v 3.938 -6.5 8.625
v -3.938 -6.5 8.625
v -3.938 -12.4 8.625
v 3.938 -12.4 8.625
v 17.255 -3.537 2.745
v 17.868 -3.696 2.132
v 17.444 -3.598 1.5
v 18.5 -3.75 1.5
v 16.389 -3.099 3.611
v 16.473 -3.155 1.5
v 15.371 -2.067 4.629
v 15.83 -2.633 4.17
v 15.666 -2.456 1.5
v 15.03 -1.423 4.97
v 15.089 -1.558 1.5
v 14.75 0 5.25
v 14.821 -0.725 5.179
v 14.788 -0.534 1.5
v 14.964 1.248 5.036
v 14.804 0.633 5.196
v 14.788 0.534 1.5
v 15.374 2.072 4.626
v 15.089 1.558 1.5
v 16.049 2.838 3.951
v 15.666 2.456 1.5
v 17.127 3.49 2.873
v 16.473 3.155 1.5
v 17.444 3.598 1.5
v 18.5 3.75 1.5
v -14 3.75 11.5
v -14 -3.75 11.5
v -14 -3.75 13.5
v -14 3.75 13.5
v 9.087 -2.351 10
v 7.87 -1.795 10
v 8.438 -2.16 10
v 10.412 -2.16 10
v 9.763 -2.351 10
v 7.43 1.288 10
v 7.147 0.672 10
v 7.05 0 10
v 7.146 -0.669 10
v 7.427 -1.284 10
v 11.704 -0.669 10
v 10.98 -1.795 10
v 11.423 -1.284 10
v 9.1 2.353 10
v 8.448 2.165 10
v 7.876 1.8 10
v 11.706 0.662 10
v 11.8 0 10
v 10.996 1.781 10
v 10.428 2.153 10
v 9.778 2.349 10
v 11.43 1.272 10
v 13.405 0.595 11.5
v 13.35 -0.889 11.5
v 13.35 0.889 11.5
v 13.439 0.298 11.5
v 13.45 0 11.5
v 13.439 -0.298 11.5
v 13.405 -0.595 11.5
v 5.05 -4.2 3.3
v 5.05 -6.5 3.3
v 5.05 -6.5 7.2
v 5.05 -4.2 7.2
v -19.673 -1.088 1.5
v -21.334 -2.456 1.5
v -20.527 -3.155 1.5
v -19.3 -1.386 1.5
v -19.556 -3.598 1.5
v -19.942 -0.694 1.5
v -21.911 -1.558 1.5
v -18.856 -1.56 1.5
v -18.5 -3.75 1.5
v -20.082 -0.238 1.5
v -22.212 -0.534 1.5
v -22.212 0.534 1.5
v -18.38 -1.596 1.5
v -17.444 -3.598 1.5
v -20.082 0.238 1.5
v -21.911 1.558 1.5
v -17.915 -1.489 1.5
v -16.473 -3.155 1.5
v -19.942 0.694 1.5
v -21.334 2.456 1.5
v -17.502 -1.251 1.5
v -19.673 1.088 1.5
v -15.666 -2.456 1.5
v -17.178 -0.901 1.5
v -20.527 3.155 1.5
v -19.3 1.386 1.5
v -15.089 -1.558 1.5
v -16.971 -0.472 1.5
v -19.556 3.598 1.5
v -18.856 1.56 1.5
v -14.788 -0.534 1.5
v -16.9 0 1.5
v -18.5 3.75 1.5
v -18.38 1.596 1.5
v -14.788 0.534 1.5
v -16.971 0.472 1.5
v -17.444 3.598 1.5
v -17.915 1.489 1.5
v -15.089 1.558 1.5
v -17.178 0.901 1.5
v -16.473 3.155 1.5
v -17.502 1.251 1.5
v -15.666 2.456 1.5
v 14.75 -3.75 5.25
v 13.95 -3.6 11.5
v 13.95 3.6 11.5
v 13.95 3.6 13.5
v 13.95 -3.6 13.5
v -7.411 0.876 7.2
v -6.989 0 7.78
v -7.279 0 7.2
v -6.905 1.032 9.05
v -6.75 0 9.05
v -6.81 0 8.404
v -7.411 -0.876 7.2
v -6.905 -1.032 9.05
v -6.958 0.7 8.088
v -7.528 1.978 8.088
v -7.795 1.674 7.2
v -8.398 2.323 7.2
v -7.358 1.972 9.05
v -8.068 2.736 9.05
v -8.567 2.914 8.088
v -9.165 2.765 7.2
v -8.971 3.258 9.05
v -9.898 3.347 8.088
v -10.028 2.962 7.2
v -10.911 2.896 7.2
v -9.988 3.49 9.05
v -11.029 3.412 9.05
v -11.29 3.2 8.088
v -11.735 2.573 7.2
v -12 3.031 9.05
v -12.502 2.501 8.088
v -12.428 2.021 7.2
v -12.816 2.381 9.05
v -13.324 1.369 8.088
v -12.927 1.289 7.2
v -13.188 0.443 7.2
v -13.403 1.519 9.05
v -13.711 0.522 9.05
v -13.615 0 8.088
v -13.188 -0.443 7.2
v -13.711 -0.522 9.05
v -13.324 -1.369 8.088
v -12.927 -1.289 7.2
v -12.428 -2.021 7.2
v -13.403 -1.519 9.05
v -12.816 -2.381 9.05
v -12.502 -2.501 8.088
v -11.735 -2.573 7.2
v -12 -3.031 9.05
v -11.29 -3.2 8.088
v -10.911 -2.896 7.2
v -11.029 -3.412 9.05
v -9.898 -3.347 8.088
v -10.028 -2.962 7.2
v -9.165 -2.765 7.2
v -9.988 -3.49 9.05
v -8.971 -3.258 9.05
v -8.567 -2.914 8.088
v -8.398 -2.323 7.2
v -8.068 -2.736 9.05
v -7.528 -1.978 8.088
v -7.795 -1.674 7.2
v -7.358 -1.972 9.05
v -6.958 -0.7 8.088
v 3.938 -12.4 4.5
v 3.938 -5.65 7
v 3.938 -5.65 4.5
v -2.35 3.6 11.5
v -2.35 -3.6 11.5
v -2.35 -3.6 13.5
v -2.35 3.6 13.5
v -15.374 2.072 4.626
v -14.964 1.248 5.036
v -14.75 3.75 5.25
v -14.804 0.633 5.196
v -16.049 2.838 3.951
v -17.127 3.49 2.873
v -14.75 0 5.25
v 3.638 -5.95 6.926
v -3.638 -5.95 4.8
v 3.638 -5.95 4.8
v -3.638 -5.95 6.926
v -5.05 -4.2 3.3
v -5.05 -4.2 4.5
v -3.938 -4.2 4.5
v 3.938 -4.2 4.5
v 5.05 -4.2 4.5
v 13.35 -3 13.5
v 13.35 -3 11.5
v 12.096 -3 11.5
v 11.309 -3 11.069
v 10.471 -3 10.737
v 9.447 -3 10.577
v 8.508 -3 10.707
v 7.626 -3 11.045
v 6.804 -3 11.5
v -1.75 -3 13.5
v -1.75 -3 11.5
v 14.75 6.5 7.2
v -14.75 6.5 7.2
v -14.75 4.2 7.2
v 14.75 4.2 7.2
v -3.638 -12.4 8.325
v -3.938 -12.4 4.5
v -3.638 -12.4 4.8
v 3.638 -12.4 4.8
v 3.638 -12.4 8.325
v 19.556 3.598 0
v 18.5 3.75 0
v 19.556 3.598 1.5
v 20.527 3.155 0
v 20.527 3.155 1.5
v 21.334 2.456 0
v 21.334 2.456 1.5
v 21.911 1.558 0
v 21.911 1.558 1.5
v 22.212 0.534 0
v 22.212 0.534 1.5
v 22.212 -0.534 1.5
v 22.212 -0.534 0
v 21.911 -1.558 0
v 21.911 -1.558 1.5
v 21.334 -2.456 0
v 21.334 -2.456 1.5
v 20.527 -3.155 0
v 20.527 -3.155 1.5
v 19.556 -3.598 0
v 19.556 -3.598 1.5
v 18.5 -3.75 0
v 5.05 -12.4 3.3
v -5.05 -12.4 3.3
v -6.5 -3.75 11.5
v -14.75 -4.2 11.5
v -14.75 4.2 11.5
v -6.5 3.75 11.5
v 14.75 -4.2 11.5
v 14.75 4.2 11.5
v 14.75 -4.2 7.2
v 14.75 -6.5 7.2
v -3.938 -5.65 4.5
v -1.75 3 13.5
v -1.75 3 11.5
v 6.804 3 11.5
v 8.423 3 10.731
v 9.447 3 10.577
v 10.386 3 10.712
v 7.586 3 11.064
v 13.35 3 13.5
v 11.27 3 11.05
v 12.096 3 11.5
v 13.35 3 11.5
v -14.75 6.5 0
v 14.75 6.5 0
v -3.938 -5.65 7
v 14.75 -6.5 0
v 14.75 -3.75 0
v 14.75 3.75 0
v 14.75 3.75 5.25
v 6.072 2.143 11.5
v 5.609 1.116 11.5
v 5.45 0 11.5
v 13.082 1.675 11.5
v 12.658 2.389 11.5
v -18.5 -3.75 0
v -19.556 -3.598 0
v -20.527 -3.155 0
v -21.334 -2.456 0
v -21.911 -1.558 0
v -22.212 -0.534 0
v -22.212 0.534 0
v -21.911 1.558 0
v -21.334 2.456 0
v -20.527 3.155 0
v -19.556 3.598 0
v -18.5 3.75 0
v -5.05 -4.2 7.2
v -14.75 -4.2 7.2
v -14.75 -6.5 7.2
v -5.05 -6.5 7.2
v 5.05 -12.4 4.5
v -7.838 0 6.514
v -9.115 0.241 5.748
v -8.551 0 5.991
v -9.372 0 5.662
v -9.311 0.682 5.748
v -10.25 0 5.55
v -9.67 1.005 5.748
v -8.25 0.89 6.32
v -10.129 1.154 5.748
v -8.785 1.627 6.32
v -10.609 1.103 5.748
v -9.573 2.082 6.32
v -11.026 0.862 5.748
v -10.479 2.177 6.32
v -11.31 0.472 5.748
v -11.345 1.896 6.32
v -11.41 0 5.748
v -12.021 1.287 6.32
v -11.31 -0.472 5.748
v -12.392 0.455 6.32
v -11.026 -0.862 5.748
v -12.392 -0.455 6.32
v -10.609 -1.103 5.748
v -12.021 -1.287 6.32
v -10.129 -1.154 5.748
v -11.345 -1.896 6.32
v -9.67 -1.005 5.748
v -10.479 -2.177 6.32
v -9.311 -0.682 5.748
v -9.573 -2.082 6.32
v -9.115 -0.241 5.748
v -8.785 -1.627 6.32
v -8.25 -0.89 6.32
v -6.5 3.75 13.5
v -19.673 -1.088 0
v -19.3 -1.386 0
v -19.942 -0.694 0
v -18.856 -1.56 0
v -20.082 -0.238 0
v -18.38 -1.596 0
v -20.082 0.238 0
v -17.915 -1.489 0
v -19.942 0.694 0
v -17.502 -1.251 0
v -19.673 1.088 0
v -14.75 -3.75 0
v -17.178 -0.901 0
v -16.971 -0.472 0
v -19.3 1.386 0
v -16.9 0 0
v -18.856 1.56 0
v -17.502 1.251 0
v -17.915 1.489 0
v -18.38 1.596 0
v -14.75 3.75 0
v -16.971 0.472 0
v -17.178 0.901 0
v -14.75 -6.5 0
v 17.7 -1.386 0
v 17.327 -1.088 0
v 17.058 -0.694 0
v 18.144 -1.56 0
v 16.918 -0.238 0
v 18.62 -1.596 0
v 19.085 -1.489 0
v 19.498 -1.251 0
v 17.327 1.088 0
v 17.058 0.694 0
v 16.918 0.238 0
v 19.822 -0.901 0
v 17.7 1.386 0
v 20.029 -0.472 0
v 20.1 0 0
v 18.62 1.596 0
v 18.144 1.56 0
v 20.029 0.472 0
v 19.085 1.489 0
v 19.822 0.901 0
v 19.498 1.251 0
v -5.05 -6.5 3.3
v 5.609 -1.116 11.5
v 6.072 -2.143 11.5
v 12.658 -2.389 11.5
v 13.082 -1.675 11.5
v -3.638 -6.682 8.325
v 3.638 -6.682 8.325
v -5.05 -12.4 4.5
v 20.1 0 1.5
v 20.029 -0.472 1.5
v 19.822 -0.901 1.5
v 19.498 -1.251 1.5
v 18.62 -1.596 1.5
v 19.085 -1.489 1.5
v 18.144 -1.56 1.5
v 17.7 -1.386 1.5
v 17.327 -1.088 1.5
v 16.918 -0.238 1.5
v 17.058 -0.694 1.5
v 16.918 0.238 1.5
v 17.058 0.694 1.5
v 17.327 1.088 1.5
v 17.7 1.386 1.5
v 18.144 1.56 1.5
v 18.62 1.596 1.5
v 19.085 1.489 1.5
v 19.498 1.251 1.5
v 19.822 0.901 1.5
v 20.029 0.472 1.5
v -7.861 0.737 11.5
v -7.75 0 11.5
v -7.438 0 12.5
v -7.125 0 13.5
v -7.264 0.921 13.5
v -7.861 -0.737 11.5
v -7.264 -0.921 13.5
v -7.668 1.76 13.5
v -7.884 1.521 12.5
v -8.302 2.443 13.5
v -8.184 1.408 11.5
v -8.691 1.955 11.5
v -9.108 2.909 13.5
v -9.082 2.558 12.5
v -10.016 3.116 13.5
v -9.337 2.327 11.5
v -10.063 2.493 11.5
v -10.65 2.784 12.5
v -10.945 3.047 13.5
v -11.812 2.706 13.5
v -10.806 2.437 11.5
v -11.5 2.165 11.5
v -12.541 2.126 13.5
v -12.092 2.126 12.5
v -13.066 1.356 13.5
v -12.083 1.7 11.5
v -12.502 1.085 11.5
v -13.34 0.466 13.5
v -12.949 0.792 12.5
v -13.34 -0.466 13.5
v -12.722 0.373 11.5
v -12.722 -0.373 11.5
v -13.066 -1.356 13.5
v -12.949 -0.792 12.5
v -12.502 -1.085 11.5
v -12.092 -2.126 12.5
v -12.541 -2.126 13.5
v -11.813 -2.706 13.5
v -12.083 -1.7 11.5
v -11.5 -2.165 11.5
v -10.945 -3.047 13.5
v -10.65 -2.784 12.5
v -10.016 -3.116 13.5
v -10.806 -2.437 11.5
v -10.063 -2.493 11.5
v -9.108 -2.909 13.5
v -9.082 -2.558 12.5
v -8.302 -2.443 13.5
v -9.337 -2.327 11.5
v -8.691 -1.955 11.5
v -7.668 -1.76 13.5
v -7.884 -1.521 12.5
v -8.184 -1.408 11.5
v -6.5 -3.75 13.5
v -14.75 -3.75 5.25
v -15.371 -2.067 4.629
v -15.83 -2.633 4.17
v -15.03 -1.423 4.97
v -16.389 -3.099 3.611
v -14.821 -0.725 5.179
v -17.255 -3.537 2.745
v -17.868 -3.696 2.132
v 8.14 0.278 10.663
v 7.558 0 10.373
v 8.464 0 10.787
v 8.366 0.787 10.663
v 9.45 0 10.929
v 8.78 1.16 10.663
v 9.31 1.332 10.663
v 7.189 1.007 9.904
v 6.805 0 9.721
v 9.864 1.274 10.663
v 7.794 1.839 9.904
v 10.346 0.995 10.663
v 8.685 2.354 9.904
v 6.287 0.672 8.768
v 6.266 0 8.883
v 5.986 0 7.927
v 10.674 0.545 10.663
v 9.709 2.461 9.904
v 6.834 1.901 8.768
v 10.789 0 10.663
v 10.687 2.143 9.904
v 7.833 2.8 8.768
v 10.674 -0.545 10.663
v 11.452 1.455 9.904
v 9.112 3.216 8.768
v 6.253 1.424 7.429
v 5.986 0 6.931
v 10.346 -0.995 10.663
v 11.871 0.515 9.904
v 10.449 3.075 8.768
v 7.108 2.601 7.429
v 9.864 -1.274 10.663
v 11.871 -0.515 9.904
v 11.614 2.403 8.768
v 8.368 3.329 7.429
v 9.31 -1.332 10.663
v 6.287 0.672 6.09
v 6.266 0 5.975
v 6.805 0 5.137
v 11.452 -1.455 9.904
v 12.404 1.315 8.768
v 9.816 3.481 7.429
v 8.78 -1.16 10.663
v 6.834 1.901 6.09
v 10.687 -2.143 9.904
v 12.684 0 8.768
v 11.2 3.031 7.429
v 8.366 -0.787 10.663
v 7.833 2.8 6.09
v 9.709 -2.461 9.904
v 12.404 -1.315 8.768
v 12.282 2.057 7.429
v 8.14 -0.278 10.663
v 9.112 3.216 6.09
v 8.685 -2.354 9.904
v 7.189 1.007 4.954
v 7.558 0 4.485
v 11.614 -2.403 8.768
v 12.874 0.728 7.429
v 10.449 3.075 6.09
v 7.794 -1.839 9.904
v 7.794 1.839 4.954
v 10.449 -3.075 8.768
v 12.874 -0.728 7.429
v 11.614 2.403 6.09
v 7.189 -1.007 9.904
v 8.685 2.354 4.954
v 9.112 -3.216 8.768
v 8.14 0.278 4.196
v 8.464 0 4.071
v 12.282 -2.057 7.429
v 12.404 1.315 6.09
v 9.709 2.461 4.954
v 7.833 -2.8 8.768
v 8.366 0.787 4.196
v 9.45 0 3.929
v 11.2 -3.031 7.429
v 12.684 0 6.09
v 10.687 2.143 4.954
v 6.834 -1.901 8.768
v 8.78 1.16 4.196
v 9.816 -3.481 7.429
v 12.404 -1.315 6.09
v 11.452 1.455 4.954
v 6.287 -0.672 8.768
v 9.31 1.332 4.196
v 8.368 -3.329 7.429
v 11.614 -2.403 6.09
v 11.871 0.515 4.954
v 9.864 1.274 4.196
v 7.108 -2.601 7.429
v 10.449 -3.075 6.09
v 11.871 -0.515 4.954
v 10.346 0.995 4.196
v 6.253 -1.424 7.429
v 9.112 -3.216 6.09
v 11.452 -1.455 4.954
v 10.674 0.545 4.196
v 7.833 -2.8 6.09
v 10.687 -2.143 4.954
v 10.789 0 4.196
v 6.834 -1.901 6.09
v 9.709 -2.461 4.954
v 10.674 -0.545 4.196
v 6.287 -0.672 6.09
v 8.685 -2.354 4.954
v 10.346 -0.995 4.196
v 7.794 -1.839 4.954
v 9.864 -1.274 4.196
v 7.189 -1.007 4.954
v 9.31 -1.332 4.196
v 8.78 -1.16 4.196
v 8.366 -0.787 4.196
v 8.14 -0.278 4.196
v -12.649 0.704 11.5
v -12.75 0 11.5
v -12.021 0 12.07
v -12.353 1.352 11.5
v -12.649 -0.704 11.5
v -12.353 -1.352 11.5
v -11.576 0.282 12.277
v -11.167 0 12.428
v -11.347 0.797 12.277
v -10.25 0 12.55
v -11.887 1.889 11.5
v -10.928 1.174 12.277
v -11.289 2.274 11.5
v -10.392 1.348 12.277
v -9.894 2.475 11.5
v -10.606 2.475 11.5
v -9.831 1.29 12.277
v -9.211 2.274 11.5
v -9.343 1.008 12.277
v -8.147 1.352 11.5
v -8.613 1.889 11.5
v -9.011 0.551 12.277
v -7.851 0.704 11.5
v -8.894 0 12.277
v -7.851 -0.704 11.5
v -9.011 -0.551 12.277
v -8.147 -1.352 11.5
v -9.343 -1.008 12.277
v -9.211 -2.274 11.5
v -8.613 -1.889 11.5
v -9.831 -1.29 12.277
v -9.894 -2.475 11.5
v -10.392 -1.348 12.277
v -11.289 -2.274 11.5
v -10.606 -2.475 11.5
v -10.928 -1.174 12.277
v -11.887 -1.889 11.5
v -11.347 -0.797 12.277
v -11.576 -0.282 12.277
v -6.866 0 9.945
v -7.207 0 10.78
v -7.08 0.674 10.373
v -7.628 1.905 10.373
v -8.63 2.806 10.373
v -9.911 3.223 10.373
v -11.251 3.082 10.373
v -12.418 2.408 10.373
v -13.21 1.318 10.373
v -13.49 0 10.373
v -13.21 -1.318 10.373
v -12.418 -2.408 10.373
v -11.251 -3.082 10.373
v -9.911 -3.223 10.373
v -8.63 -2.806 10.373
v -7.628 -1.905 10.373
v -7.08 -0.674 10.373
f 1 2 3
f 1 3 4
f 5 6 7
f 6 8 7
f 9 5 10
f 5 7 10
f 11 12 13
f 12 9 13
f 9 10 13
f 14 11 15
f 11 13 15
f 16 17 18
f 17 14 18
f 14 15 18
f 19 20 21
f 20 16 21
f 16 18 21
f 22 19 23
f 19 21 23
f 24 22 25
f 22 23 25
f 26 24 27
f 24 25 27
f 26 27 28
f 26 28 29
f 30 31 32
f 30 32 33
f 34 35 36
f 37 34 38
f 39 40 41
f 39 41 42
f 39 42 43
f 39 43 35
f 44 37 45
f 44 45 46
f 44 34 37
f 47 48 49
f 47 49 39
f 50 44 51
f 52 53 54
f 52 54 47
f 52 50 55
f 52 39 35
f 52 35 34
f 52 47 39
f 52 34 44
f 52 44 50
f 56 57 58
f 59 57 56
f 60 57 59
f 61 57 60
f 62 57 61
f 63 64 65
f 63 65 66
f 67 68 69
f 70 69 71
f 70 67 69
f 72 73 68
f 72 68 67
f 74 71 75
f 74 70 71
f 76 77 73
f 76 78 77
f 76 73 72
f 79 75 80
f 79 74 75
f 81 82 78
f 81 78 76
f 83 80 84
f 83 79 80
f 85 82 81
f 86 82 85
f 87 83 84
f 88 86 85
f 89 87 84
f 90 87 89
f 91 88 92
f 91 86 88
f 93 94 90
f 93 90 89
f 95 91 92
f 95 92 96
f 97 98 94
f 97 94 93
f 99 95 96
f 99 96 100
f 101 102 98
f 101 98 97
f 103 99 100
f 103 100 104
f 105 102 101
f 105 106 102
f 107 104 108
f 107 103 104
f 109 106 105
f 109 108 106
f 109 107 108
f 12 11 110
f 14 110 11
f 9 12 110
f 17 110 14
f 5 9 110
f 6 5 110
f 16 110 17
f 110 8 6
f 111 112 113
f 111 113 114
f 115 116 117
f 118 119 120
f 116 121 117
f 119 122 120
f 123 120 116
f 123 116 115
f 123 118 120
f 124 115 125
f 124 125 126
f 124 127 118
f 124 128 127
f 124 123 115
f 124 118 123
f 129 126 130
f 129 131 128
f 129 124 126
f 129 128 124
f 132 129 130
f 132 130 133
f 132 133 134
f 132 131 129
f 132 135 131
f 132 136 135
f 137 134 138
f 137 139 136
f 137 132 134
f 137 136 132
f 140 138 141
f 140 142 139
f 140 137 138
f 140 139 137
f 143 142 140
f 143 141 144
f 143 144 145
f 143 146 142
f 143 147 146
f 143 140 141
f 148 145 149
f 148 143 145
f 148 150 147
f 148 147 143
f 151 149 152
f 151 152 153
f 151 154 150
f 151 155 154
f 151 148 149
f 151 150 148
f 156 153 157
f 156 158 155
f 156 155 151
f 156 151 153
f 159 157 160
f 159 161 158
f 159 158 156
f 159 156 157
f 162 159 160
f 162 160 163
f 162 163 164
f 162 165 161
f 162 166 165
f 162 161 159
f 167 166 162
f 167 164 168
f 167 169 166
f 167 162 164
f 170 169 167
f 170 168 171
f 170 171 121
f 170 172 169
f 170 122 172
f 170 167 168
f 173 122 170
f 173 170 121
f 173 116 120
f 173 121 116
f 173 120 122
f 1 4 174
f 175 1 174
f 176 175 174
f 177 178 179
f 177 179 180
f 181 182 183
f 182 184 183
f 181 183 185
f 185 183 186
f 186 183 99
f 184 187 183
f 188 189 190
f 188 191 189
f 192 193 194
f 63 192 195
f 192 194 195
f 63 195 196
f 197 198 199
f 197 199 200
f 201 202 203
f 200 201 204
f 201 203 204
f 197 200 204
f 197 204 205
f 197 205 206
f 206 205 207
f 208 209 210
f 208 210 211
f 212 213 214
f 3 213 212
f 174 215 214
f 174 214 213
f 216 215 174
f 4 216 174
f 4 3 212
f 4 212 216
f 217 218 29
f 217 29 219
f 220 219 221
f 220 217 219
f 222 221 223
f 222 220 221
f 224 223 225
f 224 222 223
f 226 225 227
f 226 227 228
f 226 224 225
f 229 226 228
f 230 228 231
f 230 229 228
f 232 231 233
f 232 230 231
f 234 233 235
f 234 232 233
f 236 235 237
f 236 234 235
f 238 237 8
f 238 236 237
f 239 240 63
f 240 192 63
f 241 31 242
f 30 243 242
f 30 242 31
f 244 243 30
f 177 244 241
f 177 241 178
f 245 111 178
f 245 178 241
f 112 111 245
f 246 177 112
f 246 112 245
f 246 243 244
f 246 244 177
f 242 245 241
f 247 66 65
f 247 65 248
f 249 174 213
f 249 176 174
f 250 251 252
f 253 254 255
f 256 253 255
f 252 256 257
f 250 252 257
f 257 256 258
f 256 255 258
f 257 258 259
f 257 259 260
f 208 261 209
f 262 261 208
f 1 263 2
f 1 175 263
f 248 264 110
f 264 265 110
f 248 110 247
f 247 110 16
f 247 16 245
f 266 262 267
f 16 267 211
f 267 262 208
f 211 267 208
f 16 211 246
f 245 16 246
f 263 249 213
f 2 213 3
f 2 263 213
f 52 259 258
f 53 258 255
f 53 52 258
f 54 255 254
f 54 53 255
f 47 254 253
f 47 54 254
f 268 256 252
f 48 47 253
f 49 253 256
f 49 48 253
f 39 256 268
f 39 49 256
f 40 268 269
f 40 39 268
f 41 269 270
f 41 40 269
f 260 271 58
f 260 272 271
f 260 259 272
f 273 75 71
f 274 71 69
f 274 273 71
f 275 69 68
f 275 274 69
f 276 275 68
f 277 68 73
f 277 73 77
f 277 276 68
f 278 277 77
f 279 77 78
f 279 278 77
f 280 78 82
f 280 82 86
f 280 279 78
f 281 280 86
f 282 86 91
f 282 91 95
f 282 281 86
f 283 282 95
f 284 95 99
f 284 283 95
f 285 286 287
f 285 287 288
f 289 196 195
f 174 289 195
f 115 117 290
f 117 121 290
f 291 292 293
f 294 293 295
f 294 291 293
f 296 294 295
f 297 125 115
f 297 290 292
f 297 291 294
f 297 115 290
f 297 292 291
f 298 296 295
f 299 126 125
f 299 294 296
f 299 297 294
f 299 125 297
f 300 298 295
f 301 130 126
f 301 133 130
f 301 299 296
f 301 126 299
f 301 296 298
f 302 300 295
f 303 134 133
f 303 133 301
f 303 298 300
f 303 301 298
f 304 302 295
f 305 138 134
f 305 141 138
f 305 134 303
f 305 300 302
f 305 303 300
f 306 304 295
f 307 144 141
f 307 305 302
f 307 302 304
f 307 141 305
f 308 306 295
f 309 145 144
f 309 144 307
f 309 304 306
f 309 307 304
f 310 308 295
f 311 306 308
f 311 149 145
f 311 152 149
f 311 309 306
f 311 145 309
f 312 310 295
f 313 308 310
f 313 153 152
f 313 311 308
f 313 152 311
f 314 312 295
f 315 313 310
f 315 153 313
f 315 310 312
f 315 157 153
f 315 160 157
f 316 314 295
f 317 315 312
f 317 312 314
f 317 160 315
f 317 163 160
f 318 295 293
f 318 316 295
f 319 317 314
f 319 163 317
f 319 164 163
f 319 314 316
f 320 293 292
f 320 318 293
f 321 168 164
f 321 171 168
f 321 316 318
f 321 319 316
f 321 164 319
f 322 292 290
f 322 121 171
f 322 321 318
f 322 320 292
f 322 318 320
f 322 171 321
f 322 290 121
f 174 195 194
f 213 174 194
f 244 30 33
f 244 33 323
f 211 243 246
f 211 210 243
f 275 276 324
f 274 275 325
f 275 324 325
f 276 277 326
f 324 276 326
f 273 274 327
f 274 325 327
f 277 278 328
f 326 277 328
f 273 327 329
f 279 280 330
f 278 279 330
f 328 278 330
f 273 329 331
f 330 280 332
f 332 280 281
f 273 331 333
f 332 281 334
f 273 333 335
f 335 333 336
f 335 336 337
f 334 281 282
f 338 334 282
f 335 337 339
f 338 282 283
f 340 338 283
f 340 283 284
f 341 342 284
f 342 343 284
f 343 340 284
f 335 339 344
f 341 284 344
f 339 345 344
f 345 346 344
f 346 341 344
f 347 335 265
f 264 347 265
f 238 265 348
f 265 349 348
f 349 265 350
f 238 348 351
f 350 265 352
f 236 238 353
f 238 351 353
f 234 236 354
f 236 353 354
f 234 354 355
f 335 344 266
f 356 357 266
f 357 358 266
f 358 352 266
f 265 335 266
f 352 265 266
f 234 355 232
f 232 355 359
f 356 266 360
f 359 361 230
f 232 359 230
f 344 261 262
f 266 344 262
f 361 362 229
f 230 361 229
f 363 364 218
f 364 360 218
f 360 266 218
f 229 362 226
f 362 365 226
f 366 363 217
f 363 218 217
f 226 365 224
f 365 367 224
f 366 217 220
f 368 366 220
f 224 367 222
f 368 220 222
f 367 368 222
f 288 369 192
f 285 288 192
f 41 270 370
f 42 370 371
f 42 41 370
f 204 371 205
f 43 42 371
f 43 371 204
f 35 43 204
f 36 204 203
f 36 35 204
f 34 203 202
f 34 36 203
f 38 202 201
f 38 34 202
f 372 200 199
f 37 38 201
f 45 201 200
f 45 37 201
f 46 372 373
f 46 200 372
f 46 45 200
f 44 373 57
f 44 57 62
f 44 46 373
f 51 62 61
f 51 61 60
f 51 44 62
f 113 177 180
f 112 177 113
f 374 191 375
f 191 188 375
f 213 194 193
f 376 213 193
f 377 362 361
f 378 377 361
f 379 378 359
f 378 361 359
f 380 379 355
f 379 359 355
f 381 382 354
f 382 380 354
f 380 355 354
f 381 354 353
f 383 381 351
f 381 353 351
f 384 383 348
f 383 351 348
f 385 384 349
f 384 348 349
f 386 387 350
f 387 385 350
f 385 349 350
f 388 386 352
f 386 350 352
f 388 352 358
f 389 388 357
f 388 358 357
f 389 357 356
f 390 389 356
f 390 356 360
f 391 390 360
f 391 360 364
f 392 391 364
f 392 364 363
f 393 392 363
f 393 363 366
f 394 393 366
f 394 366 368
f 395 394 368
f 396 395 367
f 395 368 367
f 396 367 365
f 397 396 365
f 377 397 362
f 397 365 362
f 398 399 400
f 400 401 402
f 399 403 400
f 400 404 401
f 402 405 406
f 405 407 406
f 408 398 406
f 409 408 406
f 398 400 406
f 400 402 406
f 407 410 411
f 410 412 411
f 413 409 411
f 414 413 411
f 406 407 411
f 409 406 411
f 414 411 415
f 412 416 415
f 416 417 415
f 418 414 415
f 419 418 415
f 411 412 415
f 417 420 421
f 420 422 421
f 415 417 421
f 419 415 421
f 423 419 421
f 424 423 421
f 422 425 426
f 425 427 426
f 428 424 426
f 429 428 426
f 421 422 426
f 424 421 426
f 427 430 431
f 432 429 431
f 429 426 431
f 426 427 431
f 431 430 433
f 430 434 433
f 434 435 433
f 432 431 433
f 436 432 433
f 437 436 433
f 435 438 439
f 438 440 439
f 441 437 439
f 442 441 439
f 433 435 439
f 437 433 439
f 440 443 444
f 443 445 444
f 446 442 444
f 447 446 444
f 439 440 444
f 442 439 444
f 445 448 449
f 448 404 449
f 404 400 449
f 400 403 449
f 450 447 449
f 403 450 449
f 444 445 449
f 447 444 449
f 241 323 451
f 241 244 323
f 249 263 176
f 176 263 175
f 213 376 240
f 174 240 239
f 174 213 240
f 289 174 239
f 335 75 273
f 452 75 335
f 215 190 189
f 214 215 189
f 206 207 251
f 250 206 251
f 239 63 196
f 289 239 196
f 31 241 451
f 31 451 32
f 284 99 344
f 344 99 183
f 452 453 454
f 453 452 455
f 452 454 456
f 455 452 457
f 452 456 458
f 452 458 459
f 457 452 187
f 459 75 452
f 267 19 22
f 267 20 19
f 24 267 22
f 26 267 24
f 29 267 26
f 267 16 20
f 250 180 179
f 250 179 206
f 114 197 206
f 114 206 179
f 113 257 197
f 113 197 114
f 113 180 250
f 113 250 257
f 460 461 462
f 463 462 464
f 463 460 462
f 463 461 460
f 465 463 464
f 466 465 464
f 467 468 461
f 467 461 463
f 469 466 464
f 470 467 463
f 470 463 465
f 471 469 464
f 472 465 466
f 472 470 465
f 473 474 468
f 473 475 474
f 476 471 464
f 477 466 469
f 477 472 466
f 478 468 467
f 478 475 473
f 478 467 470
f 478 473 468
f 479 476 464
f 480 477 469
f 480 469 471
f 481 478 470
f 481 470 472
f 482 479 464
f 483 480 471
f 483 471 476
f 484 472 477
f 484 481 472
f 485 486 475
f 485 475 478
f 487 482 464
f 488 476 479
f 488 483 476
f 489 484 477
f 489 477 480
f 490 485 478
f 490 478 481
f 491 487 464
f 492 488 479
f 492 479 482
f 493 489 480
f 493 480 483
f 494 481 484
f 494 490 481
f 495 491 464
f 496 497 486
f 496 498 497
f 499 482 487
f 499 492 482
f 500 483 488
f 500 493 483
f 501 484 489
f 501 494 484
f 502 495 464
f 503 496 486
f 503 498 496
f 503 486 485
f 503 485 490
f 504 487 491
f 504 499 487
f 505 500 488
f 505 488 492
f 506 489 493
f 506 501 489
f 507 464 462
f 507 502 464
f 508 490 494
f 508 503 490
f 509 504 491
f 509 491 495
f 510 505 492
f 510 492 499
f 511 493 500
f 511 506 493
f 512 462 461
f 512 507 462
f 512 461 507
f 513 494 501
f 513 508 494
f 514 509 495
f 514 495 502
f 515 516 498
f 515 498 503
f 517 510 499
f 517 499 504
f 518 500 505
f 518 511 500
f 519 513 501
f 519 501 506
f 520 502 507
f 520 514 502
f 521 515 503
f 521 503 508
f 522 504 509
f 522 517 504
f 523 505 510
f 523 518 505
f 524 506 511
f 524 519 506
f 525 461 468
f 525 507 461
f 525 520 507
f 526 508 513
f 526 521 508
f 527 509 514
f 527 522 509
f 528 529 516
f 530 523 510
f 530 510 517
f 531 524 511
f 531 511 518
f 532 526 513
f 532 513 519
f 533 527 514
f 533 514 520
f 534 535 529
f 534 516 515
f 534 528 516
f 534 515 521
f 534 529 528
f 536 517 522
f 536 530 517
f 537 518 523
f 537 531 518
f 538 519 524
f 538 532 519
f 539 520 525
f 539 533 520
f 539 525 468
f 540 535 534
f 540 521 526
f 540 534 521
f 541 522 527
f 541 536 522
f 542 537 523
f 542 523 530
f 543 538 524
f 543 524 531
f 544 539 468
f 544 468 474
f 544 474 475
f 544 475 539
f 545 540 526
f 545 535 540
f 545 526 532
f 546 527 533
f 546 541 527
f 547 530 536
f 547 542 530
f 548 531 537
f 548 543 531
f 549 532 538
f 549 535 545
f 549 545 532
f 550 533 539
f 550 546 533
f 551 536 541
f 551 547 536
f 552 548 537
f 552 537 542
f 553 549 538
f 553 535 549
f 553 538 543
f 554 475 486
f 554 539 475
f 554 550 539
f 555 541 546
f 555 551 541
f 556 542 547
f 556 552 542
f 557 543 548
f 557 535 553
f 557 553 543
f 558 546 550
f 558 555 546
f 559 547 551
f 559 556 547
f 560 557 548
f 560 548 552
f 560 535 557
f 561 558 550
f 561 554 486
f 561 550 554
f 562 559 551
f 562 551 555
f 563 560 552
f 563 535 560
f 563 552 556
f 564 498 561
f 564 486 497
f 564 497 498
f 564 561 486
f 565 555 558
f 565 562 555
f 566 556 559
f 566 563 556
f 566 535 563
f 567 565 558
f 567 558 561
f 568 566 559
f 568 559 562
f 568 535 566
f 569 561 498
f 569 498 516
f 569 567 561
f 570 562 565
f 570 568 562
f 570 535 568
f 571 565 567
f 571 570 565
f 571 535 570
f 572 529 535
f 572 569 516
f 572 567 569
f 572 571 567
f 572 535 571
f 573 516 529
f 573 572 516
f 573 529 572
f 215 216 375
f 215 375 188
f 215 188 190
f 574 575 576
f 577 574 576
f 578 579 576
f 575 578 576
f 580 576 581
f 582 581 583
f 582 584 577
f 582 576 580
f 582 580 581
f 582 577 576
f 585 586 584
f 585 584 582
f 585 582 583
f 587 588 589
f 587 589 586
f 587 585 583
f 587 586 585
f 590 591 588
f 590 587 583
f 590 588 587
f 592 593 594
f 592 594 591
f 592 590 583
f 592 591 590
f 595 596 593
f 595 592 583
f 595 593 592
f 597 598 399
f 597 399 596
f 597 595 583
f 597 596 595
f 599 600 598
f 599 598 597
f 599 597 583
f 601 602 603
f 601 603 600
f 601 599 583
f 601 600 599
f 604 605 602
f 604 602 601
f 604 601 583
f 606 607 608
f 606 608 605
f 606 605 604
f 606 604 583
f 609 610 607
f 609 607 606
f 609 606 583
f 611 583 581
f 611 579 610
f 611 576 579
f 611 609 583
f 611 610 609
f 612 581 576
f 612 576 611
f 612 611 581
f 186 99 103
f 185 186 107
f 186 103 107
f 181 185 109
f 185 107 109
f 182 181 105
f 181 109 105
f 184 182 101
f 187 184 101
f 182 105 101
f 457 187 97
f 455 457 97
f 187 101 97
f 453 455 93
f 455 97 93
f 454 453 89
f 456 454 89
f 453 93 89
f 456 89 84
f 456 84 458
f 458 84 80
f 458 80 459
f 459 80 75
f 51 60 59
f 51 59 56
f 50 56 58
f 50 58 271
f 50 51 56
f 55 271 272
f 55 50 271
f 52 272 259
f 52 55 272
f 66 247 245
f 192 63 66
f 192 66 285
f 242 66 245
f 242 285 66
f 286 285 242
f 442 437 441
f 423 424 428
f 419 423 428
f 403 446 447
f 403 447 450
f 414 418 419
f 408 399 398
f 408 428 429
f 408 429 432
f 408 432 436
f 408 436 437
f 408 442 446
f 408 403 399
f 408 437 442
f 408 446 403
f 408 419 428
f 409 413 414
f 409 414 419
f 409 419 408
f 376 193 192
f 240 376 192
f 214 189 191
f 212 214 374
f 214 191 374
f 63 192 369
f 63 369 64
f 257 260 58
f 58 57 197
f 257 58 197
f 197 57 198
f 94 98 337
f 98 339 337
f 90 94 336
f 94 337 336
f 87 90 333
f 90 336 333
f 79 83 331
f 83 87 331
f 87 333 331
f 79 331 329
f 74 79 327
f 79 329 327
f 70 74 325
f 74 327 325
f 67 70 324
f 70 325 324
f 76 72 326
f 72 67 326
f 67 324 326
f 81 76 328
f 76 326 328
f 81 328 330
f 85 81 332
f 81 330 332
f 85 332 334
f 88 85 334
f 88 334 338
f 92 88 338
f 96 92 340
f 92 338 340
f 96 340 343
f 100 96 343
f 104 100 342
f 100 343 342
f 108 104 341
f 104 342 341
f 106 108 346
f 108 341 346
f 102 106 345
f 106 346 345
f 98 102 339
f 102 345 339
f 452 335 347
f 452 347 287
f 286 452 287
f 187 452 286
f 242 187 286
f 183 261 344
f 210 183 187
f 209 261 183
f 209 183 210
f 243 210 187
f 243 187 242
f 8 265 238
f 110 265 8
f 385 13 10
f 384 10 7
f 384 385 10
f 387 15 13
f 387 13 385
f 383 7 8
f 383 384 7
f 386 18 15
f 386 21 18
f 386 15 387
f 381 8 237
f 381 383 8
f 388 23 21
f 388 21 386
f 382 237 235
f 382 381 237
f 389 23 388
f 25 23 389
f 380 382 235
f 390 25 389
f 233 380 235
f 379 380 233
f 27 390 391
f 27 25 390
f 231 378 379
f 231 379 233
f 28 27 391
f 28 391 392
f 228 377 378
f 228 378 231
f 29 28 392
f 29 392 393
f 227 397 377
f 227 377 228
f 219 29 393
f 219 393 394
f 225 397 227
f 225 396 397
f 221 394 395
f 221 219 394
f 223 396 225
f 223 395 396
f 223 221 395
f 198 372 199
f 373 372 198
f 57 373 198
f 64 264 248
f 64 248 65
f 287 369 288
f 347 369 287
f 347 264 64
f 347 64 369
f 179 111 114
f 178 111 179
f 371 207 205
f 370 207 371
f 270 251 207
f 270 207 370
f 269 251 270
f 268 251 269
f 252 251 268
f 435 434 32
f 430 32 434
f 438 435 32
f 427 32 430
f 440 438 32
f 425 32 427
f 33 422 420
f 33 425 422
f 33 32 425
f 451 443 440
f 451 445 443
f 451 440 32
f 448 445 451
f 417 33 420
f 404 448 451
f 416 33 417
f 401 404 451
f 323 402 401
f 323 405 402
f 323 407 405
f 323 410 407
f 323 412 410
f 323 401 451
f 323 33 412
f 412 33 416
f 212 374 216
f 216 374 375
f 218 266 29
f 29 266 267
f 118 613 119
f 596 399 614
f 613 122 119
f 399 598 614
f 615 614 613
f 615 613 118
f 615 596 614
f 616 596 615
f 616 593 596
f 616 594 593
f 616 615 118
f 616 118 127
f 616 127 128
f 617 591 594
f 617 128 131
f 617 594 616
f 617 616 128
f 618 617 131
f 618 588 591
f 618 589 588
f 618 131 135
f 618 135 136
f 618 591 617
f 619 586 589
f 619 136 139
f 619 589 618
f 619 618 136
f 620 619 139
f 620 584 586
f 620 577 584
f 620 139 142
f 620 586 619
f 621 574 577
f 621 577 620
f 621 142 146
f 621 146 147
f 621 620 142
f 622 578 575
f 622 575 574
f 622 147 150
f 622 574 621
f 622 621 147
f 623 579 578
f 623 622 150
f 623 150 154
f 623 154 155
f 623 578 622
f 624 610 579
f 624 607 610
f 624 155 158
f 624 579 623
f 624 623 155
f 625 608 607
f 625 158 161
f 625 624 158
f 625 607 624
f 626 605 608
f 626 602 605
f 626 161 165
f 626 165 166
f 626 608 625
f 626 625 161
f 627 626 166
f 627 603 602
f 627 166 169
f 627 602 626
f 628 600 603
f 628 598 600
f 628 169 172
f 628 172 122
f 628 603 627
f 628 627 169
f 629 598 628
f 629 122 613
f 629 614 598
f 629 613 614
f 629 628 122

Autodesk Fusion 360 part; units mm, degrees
sketch "Base" plane through (0, 0, 0) normal (0, 0, 1) x (1, 0, 0)
  line L0 (-14.75, 6.5) -> (14.75, 6.5)
  line L1 (14.75, 6.5) -> (14.75, -6.5)
  line L2 (14.75, -6.5) -> (-14.75, -6.5)
  line L3 (-14.75, -6.5) -> (-14.75, 6.5)
  line L4 (-18.5, 0) -> (18.5, 0) construction
  circle A0 centre (18.5, 0) radius 1.6
  circle A1 centre (18.5, 0) radius 3.75
  circle A2 centre (-18.5, 0) radius 1.6
  circle A3 centre (-18.5, 0) radius 3.75
  line L5 (-14.75, 3.75) -> (-18.5, 3.75)
  line L6 (14.75, 3.75) -> (18.5, 3.75)
  line L7 (-14.75, -3.75) -> (-18.5, -3.75)
  line L8 (14.75, -3.75) -> (18.5, -3.75)
  line L9 (-6.5, -3.75) -> (-14, -3.75)
  line L10 (-14, -3.75) -> (-14, 3.75)
  line L11 (-14, 3.75) -> (-6.5, 3.75)
  line L12 (-6.5, 3.75) -> (-6.5, -3.75)
  line L13 (-14.75, 4.2) -> (14.75, 4.2)
  line L14 (14.75, -4.2) -> (-14.75, -4.2)
  line L15 (-2.35, 3.6) -> (13.95, 3.6)
  line L16 (13.95, 3.6) -> (13.95, -3.6)
  line L17 (13.95, -3.6) -> (-2.35, -3.6)
  line L18 (-2.35, -3.6) -> (-2.35, 3.6)
  line L19 (-2.35, -3.6) -> (13.95, 3.6) construction
  line L20 (-14, -3.75) -> (-6.5, 3.75) construction
  line L21 (-14.75, -6.5) -> (14.75, 6.5) construction
  line L22 (13.35, -3) -> (-1.75, -3)
  line L23 (-1.75, -3) -> (-1.75, 3)
  line L24 (-1.75, 3) -> (13.35, 3)
  line L25 (13.35, 3) -> (13.35, -3)
  line L26 (0, 0) -> (0, -6.5) construction
  line L27 (-5.05, -6.5) -> (-5.05, -4.2)
  line L28 (5.05, -6.5) -> (5.05, -4.2)
  point P0 (-10.25, 0)
  point P1 (9.45, 0)
  point P2 (-10.25, 0)
  point P3 (5.8, 0)
  dimension "d1" = 29.5
  dimension "d2" = 13
  dimension "d3" = 37
  dimension "d4" = 3.2
  dimension "d5" = 7.5
  dimension "d6" = 19.7
  dimension "d7" = 4.5
  dimension "d8" = 7.5
  dimension "d9" = 7.5
  dimension "d10" = 8.4
  dimension "d11" = 4.2
  dimension "d12" = 16.3
  dimension "d13" = 7.2
  dimension "d14" = 4.15
  dimension "d16" = 0.6
  dimension "d62" = 10.1
  dimension "d63" = 5.05
extrude "Extrude1" add sketch "Base" along normal blind 13.5 contours L9 L10 L11 L12 | L15 L16 L17 L18 makes body 1 at (-9, -3.75, 4.5) makes body 2 at (3.0833, 3.6, 4.5)
extrude "Extrude2" add sketch "Base" along normal blind 11.5 contours L1 L3 L13 L14 | L22 L23 L24 L25 bodies 1 2
extrude "Extrude3" add sketch "Base" along normal blind 7.2 contours L0 L1 L3 L13 | L2 L3 L14 L27 | L1 L2 L14 L28 bodies 1
extrude "Extrude10" add sketch "Base" along normal blind 3.3 contours L2 L14 L27 L28 bodies 1
sketch "Fixation" plane through (0, -6.5, 0) normal (0, -1, 0) x (1, 0, 0)
  line L0 (-14.75, 0) -> (14.75, 0)
  line L1 (14.75, 0) -> (14.75, 7.2)
  line L2 (14.75, 7.2) -> (5.05, 7.2)
  line L3 (-14.75, 7.2) -> (-14.75, 0)
  line L4 (14.75, 0) -> (18.5, 0)
  line L5 (14.75, 0) -> (14.75, 5.25)
  line L6 (18.5, 0) -> (18.5, 1.5)
  line L7 (14.75, 5.25) -> (18.5, 1.5)
  line L8 (0, 0) -> (0, 3) construction
  line L9 (-14.75, 5.25) -> (-18.5, 1.5)
  line L10 (-18.5, 0) -> (-18.5, 1.5)
  line L11 (-14.75, 0) -> (-18.5, 0)
  line L12 (-14.75, 0) -> (-14.75, 5.25)
  line L13 (5.05, 7.2) -> (5.05, 3.3)
  line L14 (-5.05, 3.3) -> (-5.05, 7.2)
  line L15 (5.05, 3.3) -> (-5.05, 3.3)
  line L16 (-5.05, 7.2) -> (-14.75, 7.2)
  dimension "d25" = 3.75
  dimension "d26" = 5.25
  dimension "d27" = 1.5
extrude "Extrude5" add sketch "Fixation" along normal mid plane 7.5 from surface at -6.5 contours L3 L9 L10 L11 L12 | L1 L4 L5 L6 L7 bodies 1
extrude "Extrude6" cut sketch "Base" along normal through all contours A3 | A1 | A0 | A2 bodies 1
extrude "Extrude7" add sketch "Base" along normal blind 1.5 contours A3 | A1 bodies 1
ref_plane "WorkPlane2" through (5.8, 0, 10) normal (0, 0, 1) x (1, 0, 0)
sketch "Detector_Fitting1" plane through (0, 0, 11.5) normal (0, 0, 1) x (1, 0, 0)
  line L0 (13.35, 3) -> (-1.75, 3)
  line L1 (-1.75, 3) -> (-1.75, -3)
  line L2 (-1.75, -3) -> (13.35, -3)
  line L3 (13.35, -3) -> (13.35, 3)
  line L4 (0, 0) -> (9.45, 0) construction
  circle A0 centre (9.45, 0) radius 4
  dimension "d34" = 9.45
  dimension "d35" = 8
sketch "Detector_Fitting2" plane through (5.8, 0, 10) normal (0, 0, 1) x (1, 0, 0)
  line L0 (0, 0) -> (3.625, 0)
  circle A0 centre (3.625, 0) radius 2.375
  dimension "d38" = 3.625
  dimension "d39" = 4.75
loft "Loft1" cut profiles "Detector_Fitting1", "Detector_Fitting2" section 1 contours L0 L2 L3 A0 | L0 A0 | L3 A0 | L2 A0 section 2 bodies 1
extrude "Extrude8" add 1 faces at (-1.6833, -4.2, 10.0667) along direction (0, 1, 0) up to surface (1.2 mm away) on bodies 1 bodies 1
extrude "Extrude9" add 1 faces at (4.9167, 4.2, 10.0667) along direction (0, -1, 0) up to surface (1.2 mm away) on bodies 1 bodies 1
ref_plane "WorkPlane4" through (-10.25, 0, 11.5) normal (0, 0, 1) x (1, 0, 0)
sketch "Emitter_Fitting1" plane through (-10.25, 0, 11.5) normal (0, 0, 1) x (1, 0, 0)
  circle A0 centre (0, 0) radius 2.5
  dimension "d50" = 5
sketch "Emitter_Fitting2" plane through (0, 0, 13.5) normal (0, 0, 1) x (1, 0, 0)
  line L0 (-6.5, 3.75) -> (-14, 3.75)
  line L1 (-14, 3.75) -> (-14, -3.75)
  line L2 (-14, -3.75) -> (-6.5, -3.75)
  line L3 (-6.5, -3.75) -> (-6.5, 3.75)
  line L4 (0, 0) -> (-10.25, 0) construction
  circle A0 centre (-10.25, 0) radius 3.125
  dimension "d51" = 10.25
  dimension "d52" = 6.25
loft "Loft2" cut profiles "Emitter_Fitting2", "Emitter_Fitting1" section 1 contours A0 section 2 bodies 1
ref_plane "WorkPlane3" through (0, 0, 7.4) normal (0, -1, 0) x (1, 0, 0)
sketch "Emitter_Detector" plane through (0, 0, 0) normal (0, -1, 0) x (1, 0, 0)
  line L0 (-14.75, 7.2) -> (14.75, 7.2)
  line L1 (14.75, 7.2) -> (14.75, 11.5)
  line L2 (14.75, 11.5) -> (-14.75, 11.5)
  line L3 (-14.75, 11.5) -> (-14.75, 7.2)
  line L4 (9.45, 10) -> (9.45, 13.5577) construction
  line L5 (11.825, 10) -> (11.825, 13.5577) construction
  line L6 (7.075, 10) -> (7.075, 13.5577) construction
  circle A0 centre (9.45, 7.4291) radius 3.5
  line L7 (-14.75, 11.5) -> (-10.25, 11.5) construction
  line L8 (-10.25, 11.5) -> (-10.25, 14)
  line L9 (-7.75, 11.5) -> (-7.75, 14)
  line L10 (-12.75, 11.5) -> (-12.75, 14)
  line L11 (-10.25, 11.5) -> (-10.25, 5.5505)
  circle A1 centre (-10.25, 9.0505) radius 3.5
  line L12 (9.45, 10.9291) -> (9.45, 3.9291)
  point P0 (9.45, 10.9291)
  dimension "d45" = 2.375
  dimension "d46" = -2.375
  dimension "d47" = 7
  dimension "d53" = 4.5
  dimension "d54" = 2.5
  dimension "d55" = -2.5
  dimension "d56" = 7
  dimension "d59" = 1.5
  dimension "d60" = 5.3
revolve "Revolve1" add sketch "Emitter_Detector" angle 360 about axis through (9.45, 0, 10) along (0, 0, 1) separate body contours L0 A0 L12 | L0 A0 L12 picked at (9.2771, 9.6732) picked at (7.143, 7.0419) makes body 3
revolve "Revolve2" add sketch "Emitter_Detector" angle 360 about axis through (-10.25, 0, 11.5) along (0, 0, 1) separate body contours L0 L2 L11 A1 | L0 L11 A1 | L2 L8 A1 picked at (-9.1221, 9.5483) picked at (-10.0816, 6.1126) picked at (-10.0958, 12.1901) makes body 4
sketch "Connector_and_PCB" plane through (0, -4.2, 0) normal (0, -1, 0) x (1, 0, 0)
  line L0 (-5.05, 3.3) -> (5.05, 3.3)
  line L1 (5.05, 3.3) -> (5.05, 7.2)
  line L2 (5.05, 7.2) -> (14.75, 7.2)
  line L3 (14.75, 7.2) -> (14.75, 11.5)
  line L4 (14.75, 11.5) -> (-14.75, 11.5)
  line L5 (-14.75, 11.5) -> (-14.75, 7.2)
  line L6 (-14.75, 7.2) -> (-5.05, 7.2)
  line L7 (-5.05, 7.2) -> (-5.05, 3.3)
  line L8 (-5.05, 3.3) -> (5.05, 3.3)
  line L9 (5.05, 3.3) -> (5.05, 4.5)
  line L10 (5.05, 4.5) -> (-5.05, 4.5)
  line L11 (-5.05, 4.5) -> (-5.05, 3.3)
  line L12 (-3.9375, 4.5) -> (-3.9375, 8.625)
  line L13 (-3.9375, 8.625) -> (3.9375, 8.625)
  line L14 (3.9375, 8.625) -> (3.9375, 4.5)
  point P0 (0, 8.625)
  point P1 (0, 4.5)
  dimension "d66" = 10.1
  dimension "d67" = 1.2
  dimension "d68" = 4.125
  dimension "d69" = 7.875
extrude "Extrude11" add sketch "Connector_and_PCB" along normal blind 6.75 from surface at 1.45 separate body contours L10 L12 L13 L14 makes body 5
sketch "Connector_side" plane through (3.9375, 0, 0) normal (1, 0, 0) x (0, 0, -1)
  line L0 (-4.5, -5.65) -> (-8.625, -5.65)
  line L1 (-8.625, -5.65) -> (-8.625, -12.4)
  line L2 (-8.625, -12.4) -> (-4.5, -12.4)
  line L3 (-4.5, -12.4) -> (-4.5, -5.65)
  line L4 (-4.5, -12.4) -> (-4.5, -5.65)
  line L5 (-4.5, -12.4) -> (-8.625, -12.4)
  line L6 (-8.625, -12.4) -> (-8.625, -6.5)
  line L7 (-4.5, -5.65) -> (-7, -5.65)
  line L8 (-7, -5.65) -> (-8.625, -6.5)
  dimension "d73" = 5.9
  dimension "d75" = 2.5
extrude "Extrude12" cut sketch "Connector_side" against normal up to surface (7.875 mm away) contours L0 L1 L2 L3 L4 L5 L6 L7 L8 keep common part bodies 5
shell "Shell1" thickness 0.3 removed faces 1 at (1.3125, -12.4, 5.875) on bodies 5
extrude "Extrude13" add sketch "Connector_and_PCB" along normal blind 8.2 separate body contours L0 L1 L7 L8 L9 L10 L11 makes body 6
equation "d26 = 3.75 mm + 1.5 mm"
equation "d45 = ( 4.75 / 2 ) * 1 mm"
equation "d46 = ( -4.75 / 2 ) * 1 mm"
